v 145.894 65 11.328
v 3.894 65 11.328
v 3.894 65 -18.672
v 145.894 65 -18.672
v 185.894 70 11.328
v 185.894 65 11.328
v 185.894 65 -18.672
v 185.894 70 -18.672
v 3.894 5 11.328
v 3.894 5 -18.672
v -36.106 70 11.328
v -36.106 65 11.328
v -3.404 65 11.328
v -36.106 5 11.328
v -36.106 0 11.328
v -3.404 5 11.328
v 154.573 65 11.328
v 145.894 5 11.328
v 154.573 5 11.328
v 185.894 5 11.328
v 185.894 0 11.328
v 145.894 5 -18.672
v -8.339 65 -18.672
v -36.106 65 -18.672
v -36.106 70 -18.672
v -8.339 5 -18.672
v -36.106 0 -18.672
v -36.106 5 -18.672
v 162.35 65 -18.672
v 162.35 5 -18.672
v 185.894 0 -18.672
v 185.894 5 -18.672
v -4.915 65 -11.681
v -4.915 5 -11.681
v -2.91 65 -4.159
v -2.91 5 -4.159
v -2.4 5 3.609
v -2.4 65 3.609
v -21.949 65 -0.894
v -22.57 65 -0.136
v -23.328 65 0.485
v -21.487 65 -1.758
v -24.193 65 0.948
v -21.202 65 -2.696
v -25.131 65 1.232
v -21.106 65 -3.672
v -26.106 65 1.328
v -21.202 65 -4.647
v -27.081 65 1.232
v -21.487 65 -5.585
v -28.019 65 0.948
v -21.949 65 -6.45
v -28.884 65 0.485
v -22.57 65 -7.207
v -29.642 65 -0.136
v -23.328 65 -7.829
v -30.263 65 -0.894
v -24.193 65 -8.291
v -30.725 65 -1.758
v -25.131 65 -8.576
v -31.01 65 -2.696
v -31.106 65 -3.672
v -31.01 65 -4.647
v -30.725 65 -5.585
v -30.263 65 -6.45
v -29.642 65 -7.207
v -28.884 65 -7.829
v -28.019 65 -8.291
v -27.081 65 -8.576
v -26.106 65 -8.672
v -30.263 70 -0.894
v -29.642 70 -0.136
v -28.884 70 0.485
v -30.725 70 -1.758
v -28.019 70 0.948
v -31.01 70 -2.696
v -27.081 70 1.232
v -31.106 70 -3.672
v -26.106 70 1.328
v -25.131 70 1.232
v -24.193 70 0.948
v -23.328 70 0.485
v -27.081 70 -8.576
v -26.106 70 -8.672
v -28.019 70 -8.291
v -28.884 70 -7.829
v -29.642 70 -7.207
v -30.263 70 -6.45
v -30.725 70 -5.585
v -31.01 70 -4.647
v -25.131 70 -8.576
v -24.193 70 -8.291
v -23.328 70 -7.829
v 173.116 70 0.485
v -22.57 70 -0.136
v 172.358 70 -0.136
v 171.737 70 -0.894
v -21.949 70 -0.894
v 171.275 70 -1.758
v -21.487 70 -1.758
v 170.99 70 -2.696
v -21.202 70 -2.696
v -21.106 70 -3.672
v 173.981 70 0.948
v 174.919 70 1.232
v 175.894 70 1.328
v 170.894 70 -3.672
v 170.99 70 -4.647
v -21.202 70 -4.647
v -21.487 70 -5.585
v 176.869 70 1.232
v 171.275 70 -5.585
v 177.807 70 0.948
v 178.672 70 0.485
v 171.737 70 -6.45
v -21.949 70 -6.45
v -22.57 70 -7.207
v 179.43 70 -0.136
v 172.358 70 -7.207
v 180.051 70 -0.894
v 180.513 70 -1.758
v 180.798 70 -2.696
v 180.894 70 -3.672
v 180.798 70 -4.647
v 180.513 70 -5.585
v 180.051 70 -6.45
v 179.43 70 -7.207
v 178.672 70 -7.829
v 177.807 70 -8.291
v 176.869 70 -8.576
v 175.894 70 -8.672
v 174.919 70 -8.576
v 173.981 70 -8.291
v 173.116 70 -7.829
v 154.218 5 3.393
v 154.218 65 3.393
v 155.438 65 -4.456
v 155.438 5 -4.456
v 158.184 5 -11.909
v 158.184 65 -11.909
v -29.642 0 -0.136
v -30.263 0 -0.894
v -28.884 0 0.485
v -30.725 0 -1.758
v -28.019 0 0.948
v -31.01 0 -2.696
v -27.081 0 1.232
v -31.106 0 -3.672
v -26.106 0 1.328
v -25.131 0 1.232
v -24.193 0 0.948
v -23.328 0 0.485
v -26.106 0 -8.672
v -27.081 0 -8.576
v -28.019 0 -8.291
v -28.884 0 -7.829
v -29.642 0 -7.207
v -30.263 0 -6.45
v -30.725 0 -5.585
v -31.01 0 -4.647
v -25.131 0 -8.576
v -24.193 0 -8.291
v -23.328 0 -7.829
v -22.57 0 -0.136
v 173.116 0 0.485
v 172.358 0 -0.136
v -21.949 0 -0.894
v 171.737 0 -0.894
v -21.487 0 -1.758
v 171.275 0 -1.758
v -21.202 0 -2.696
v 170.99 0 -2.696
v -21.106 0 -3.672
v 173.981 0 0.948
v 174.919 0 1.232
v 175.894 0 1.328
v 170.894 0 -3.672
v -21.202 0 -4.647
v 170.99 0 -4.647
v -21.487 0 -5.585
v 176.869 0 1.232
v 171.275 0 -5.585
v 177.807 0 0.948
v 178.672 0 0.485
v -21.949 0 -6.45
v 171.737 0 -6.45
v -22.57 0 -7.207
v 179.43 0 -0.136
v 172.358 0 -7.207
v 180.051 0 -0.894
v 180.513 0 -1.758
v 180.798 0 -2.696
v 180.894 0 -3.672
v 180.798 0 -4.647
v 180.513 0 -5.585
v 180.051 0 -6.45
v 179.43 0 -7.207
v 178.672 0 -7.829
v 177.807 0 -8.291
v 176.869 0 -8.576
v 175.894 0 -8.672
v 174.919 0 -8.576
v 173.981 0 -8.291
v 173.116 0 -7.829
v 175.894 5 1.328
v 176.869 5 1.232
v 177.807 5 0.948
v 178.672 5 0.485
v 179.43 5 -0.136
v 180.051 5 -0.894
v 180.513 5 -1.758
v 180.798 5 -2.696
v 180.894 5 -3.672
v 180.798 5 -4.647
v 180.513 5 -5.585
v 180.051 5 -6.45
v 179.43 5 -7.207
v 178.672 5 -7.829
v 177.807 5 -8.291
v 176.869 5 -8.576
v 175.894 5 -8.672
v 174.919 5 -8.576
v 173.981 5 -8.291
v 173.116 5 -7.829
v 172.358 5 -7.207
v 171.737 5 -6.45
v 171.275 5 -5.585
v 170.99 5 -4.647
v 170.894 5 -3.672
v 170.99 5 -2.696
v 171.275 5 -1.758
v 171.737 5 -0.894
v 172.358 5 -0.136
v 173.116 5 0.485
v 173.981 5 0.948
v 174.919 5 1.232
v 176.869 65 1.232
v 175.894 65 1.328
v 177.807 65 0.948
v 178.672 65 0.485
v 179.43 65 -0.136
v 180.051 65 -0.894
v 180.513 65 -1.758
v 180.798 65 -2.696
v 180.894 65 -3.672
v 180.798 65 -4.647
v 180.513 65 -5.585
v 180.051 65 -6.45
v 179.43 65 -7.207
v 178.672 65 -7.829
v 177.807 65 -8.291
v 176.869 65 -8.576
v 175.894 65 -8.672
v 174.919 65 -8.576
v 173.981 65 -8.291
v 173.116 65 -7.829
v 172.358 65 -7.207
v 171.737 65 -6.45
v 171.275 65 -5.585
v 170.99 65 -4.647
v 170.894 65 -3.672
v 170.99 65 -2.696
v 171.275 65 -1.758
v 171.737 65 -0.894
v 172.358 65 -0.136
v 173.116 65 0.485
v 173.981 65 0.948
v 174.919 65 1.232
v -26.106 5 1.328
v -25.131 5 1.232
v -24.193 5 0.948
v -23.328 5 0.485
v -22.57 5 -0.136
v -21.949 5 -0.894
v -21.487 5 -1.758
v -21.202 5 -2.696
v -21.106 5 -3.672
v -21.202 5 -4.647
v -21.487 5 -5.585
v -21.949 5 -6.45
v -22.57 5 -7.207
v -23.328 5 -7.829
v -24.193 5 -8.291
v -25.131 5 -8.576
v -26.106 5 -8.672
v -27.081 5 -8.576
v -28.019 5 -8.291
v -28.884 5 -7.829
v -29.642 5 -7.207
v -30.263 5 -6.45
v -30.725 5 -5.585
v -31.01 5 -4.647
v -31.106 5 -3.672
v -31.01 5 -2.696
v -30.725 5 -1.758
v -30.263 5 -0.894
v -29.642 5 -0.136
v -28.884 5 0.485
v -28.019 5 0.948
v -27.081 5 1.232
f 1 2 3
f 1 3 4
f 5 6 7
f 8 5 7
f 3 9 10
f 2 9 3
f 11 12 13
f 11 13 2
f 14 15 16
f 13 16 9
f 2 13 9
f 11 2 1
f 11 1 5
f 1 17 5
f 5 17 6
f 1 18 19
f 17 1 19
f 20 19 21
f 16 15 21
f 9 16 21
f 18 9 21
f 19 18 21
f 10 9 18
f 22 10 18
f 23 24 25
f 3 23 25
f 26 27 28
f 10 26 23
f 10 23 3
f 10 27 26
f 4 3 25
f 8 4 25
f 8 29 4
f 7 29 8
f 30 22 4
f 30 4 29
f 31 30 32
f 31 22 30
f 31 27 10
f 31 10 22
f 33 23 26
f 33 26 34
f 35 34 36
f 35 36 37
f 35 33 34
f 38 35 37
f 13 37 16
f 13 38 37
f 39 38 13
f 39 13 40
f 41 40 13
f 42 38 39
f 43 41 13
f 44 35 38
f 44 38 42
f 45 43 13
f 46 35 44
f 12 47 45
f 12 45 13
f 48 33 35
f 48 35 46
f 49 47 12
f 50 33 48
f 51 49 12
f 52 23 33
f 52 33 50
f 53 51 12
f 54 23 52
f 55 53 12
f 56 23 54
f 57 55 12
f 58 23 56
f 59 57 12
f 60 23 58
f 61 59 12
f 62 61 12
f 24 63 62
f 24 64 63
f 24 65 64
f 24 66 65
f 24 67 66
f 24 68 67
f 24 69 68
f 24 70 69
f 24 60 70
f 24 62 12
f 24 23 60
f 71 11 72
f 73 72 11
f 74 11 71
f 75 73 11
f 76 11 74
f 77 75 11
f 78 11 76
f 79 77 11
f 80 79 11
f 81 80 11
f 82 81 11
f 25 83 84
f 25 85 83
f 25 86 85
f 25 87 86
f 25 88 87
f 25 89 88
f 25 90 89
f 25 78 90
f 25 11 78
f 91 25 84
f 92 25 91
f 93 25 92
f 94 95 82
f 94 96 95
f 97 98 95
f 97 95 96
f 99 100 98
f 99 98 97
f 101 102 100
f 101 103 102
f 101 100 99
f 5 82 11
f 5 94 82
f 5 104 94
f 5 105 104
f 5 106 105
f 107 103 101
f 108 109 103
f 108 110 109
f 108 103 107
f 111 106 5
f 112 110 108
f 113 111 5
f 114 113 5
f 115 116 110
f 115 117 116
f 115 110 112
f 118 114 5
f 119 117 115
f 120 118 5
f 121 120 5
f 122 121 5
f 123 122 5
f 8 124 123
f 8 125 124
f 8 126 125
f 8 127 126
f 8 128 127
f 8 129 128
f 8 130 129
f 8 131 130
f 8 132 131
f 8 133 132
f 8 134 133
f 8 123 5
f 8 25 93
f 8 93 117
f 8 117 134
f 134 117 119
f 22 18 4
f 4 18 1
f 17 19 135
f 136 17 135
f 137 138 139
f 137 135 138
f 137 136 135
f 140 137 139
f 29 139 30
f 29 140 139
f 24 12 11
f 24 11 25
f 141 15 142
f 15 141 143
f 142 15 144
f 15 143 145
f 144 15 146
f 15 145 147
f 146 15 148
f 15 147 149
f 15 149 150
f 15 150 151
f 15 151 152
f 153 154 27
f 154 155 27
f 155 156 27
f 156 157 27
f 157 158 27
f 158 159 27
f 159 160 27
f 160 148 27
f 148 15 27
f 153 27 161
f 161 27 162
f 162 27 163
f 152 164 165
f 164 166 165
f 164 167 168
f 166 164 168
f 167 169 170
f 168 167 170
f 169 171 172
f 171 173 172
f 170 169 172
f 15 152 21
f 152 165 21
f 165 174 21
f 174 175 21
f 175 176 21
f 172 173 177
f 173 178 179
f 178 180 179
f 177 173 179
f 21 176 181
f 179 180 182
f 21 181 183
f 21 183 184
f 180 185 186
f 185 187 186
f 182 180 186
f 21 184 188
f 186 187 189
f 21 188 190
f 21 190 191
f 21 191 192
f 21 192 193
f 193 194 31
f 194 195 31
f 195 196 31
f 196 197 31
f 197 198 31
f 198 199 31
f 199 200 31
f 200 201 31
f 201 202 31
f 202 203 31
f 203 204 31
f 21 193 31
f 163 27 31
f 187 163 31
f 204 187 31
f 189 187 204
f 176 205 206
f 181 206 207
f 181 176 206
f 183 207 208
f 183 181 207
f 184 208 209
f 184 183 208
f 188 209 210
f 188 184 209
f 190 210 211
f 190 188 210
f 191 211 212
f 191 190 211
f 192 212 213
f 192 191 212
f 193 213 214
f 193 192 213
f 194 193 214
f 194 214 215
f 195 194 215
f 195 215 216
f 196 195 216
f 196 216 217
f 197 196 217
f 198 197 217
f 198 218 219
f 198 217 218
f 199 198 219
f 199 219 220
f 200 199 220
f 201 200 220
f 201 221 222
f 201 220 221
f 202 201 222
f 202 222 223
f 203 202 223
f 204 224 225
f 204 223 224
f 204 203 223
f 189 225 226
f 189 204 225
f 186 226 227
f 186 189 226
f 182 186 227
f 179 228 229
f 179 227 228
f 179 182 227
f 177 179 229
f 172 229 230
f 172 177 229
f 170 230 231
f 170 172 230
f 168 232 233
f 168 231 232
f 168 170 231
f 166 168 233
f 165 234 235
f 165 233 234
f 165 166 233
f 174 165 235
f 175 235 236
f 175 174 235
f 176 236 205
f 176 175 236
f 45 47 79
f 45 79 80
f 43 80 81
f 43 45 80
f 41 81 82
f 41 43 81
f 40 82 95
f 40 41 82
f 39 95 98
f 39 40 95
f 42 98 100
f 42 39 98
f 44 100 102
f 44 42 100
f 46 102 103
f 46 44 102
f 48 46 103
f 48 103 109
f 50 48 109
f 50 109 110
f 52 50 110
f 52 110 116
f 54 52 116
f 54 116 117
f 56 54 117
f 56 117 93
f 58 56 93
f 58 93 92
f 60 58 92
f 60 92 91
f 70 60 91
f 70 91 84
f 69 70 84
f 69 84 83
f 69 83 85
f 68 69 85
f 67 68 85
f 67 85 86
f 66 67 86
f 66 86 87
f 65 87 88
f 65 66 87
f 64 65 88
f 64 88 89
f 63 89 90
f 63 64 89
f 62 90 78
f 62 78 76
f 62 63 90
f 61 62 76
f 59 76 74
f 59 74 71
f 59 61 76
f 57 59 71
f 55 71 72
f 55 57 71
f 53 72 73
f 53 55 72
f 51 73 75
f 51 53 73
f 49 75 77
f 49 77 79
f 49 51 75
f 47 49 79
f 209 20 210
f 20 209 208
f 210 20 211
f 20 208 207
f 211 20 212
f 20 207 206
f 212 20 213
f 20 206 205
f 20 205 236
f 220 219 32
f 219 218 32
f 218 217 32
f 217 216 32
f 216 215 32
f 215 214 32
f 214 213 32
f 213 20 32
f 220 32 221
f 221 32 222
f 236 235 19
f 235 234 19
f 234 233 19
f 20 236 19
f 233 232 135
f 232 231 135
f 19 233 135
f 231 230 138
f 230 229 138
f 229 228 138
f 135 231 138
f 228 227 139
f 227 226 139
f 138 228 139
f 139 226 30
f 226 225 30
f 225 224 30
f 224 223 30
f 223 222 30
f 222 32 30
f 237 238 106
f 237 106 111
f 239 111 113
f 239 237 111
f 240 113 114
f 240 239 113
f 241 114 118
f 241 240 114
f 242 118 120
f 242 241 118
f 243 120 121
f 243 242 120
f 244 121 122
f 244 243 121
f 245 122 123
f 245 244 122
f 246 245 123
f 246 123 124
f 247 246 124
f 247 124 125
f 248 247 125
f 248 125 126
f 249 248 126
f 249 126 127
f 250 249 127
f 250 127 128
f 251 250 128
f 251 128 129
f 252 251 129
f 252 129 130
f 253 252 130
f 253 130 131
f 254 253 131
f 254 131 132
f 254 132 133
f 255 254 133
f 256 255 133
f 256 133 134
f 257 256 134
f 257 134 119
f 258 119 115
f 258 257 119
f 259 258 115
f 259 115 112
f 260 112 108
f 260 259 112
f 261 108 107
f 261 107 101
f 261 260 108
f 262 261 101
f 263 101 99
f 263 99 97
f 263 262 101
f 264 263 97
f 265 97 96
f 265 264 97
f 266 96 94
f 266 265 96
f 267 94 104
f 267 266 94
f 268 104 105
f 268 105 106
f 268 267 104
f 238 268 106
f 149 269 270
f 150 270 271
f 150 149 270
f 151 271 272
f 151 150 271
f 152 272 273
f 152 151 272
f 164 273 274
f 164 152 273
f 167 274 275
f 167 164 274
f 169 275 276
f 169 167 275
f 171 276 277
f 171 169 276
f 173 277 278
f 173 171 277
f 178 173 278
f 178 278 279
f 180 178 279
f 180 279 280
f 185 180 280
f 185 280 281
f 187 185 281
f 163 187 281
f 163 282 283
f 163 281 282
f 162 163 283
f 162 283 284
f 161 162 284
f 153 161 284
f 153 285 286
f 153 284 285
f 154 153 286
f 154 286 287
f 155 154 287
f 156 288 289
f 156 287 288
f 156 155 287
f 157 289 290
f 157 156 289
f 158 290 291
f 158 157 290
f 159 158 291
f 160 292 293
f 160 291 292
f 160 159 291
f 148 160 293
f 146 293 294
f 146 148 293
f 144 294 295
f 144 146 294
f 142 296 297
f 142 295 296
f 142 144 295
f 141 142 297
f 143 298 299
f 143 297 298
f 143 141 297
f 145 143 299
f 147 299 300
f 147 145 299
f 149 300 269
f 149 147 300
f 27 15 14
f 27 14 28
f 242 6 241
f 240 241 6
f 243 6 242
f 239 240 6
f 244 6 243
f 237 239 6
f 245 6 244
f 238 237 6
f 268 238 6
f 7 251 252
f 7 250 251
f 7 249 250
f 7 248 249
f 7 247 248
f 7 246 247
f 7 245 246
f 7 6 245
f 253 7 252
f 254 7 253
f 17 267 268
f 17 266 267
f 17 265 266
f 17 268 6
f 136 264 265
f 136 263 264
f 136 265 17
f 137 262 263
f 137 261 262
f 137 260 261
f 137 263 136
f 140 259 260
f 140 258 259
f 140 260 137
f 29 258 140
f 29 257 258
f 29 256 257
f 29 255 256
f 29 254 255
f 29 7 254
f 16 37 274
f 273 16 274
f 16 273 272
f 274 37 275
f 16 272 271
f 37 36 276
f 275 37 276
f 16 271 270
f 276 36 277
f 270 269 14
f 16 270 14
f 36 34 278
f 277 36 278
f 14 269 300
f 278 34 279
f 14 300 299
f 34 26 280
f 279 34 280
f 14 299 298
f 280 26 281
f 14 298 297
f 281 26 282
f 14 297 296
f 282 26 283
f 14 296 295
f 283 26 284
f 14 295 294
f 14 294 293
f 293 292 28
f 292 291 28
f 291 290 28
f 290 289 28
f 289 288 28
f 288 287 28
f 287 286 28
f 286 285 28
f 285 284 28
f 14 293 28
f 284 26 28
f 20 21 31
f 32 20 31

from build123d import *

# Parameters (mm, degrees)
CROQUIS1_W                 = 222
CROQUIS1_H                 = 30
CROQUIS1_R                 = 5
SALIENTE_EXTRUIR1_DEPTH    = 70
CORTAR_EXTRUIR1_DEPTH      = 30
CORTAR_EXTRUIR1_DEPTH_BACK = 30
CROQUIS2_R                 = 40
CROQUIS3_W                 = 142
CROQUIS3_H                 = 60
CORTAR_EXTRUIR2_DEPTH      = 201.889443058


with BuildPart() as part:
    # Croquis1 → Saliente-Extruir1 (new body)
    with BuildSketch(Plane(origin=(0, 0, 0), x_dir=(1, 0, 0), z_dir=(0, 1, 0))):
        with Locations((74.893970672, 3.671875)):
            Rectangle(CROQUIS1_W, CROQUIS1_H)
        with Locations(Location((-26.106029328, 3.671875, 0), (0, 0, 270))):
            Circle(CROQUIS1_R, mode=Mode.SUBTRACT)
        with Locations(Location((175.893970672, 3.671875, 0), (0, 0, 270))):
            Circle(CROQUIS1_R, mode=Mode.SUBTRACT)
    extrude(amount=SALIENTE_EXTRUIR1_DEPTH)

    # Croquis2 → Cortar-Extruir1 (cut, two sides: drawn at the far end of the back side and taken through both)
    with BuildSketch(Plane(origin=(0, 35, 0), x_dir=(-1, 0, 0), z_dir=(0, -1, 0)).offset(-CORTAR_EXTRUIR1_DEPTH_BACK)):
        with Locations((42.379372645, -2.333916419)):
            Circle(CROQUIS2_R)
        with Locations((-194.158036126, -5.581508709)):
            Circle(CROQUIS2_R)
    extrude(amount=CORTAR_EXTRUIR1_DEPTH + CORTAR_EXTRUIR1_DEPTH_BACK, mode=Mode.SUBTRACT)

    # Croquis3 → Cortar-Extruir2 (cut, through all)
    with BuildSketch(Plane.XY.offset(11.328125)):
        with Locations((74.893970672, 35)):
            Rectangle(CROQUIS3_W, CROQUIS3_H)
    extrude(amount=-CORTAR_EXTRUIR2_DEPTH, mode=Mode.SUBTRACT)


solid = part.part
